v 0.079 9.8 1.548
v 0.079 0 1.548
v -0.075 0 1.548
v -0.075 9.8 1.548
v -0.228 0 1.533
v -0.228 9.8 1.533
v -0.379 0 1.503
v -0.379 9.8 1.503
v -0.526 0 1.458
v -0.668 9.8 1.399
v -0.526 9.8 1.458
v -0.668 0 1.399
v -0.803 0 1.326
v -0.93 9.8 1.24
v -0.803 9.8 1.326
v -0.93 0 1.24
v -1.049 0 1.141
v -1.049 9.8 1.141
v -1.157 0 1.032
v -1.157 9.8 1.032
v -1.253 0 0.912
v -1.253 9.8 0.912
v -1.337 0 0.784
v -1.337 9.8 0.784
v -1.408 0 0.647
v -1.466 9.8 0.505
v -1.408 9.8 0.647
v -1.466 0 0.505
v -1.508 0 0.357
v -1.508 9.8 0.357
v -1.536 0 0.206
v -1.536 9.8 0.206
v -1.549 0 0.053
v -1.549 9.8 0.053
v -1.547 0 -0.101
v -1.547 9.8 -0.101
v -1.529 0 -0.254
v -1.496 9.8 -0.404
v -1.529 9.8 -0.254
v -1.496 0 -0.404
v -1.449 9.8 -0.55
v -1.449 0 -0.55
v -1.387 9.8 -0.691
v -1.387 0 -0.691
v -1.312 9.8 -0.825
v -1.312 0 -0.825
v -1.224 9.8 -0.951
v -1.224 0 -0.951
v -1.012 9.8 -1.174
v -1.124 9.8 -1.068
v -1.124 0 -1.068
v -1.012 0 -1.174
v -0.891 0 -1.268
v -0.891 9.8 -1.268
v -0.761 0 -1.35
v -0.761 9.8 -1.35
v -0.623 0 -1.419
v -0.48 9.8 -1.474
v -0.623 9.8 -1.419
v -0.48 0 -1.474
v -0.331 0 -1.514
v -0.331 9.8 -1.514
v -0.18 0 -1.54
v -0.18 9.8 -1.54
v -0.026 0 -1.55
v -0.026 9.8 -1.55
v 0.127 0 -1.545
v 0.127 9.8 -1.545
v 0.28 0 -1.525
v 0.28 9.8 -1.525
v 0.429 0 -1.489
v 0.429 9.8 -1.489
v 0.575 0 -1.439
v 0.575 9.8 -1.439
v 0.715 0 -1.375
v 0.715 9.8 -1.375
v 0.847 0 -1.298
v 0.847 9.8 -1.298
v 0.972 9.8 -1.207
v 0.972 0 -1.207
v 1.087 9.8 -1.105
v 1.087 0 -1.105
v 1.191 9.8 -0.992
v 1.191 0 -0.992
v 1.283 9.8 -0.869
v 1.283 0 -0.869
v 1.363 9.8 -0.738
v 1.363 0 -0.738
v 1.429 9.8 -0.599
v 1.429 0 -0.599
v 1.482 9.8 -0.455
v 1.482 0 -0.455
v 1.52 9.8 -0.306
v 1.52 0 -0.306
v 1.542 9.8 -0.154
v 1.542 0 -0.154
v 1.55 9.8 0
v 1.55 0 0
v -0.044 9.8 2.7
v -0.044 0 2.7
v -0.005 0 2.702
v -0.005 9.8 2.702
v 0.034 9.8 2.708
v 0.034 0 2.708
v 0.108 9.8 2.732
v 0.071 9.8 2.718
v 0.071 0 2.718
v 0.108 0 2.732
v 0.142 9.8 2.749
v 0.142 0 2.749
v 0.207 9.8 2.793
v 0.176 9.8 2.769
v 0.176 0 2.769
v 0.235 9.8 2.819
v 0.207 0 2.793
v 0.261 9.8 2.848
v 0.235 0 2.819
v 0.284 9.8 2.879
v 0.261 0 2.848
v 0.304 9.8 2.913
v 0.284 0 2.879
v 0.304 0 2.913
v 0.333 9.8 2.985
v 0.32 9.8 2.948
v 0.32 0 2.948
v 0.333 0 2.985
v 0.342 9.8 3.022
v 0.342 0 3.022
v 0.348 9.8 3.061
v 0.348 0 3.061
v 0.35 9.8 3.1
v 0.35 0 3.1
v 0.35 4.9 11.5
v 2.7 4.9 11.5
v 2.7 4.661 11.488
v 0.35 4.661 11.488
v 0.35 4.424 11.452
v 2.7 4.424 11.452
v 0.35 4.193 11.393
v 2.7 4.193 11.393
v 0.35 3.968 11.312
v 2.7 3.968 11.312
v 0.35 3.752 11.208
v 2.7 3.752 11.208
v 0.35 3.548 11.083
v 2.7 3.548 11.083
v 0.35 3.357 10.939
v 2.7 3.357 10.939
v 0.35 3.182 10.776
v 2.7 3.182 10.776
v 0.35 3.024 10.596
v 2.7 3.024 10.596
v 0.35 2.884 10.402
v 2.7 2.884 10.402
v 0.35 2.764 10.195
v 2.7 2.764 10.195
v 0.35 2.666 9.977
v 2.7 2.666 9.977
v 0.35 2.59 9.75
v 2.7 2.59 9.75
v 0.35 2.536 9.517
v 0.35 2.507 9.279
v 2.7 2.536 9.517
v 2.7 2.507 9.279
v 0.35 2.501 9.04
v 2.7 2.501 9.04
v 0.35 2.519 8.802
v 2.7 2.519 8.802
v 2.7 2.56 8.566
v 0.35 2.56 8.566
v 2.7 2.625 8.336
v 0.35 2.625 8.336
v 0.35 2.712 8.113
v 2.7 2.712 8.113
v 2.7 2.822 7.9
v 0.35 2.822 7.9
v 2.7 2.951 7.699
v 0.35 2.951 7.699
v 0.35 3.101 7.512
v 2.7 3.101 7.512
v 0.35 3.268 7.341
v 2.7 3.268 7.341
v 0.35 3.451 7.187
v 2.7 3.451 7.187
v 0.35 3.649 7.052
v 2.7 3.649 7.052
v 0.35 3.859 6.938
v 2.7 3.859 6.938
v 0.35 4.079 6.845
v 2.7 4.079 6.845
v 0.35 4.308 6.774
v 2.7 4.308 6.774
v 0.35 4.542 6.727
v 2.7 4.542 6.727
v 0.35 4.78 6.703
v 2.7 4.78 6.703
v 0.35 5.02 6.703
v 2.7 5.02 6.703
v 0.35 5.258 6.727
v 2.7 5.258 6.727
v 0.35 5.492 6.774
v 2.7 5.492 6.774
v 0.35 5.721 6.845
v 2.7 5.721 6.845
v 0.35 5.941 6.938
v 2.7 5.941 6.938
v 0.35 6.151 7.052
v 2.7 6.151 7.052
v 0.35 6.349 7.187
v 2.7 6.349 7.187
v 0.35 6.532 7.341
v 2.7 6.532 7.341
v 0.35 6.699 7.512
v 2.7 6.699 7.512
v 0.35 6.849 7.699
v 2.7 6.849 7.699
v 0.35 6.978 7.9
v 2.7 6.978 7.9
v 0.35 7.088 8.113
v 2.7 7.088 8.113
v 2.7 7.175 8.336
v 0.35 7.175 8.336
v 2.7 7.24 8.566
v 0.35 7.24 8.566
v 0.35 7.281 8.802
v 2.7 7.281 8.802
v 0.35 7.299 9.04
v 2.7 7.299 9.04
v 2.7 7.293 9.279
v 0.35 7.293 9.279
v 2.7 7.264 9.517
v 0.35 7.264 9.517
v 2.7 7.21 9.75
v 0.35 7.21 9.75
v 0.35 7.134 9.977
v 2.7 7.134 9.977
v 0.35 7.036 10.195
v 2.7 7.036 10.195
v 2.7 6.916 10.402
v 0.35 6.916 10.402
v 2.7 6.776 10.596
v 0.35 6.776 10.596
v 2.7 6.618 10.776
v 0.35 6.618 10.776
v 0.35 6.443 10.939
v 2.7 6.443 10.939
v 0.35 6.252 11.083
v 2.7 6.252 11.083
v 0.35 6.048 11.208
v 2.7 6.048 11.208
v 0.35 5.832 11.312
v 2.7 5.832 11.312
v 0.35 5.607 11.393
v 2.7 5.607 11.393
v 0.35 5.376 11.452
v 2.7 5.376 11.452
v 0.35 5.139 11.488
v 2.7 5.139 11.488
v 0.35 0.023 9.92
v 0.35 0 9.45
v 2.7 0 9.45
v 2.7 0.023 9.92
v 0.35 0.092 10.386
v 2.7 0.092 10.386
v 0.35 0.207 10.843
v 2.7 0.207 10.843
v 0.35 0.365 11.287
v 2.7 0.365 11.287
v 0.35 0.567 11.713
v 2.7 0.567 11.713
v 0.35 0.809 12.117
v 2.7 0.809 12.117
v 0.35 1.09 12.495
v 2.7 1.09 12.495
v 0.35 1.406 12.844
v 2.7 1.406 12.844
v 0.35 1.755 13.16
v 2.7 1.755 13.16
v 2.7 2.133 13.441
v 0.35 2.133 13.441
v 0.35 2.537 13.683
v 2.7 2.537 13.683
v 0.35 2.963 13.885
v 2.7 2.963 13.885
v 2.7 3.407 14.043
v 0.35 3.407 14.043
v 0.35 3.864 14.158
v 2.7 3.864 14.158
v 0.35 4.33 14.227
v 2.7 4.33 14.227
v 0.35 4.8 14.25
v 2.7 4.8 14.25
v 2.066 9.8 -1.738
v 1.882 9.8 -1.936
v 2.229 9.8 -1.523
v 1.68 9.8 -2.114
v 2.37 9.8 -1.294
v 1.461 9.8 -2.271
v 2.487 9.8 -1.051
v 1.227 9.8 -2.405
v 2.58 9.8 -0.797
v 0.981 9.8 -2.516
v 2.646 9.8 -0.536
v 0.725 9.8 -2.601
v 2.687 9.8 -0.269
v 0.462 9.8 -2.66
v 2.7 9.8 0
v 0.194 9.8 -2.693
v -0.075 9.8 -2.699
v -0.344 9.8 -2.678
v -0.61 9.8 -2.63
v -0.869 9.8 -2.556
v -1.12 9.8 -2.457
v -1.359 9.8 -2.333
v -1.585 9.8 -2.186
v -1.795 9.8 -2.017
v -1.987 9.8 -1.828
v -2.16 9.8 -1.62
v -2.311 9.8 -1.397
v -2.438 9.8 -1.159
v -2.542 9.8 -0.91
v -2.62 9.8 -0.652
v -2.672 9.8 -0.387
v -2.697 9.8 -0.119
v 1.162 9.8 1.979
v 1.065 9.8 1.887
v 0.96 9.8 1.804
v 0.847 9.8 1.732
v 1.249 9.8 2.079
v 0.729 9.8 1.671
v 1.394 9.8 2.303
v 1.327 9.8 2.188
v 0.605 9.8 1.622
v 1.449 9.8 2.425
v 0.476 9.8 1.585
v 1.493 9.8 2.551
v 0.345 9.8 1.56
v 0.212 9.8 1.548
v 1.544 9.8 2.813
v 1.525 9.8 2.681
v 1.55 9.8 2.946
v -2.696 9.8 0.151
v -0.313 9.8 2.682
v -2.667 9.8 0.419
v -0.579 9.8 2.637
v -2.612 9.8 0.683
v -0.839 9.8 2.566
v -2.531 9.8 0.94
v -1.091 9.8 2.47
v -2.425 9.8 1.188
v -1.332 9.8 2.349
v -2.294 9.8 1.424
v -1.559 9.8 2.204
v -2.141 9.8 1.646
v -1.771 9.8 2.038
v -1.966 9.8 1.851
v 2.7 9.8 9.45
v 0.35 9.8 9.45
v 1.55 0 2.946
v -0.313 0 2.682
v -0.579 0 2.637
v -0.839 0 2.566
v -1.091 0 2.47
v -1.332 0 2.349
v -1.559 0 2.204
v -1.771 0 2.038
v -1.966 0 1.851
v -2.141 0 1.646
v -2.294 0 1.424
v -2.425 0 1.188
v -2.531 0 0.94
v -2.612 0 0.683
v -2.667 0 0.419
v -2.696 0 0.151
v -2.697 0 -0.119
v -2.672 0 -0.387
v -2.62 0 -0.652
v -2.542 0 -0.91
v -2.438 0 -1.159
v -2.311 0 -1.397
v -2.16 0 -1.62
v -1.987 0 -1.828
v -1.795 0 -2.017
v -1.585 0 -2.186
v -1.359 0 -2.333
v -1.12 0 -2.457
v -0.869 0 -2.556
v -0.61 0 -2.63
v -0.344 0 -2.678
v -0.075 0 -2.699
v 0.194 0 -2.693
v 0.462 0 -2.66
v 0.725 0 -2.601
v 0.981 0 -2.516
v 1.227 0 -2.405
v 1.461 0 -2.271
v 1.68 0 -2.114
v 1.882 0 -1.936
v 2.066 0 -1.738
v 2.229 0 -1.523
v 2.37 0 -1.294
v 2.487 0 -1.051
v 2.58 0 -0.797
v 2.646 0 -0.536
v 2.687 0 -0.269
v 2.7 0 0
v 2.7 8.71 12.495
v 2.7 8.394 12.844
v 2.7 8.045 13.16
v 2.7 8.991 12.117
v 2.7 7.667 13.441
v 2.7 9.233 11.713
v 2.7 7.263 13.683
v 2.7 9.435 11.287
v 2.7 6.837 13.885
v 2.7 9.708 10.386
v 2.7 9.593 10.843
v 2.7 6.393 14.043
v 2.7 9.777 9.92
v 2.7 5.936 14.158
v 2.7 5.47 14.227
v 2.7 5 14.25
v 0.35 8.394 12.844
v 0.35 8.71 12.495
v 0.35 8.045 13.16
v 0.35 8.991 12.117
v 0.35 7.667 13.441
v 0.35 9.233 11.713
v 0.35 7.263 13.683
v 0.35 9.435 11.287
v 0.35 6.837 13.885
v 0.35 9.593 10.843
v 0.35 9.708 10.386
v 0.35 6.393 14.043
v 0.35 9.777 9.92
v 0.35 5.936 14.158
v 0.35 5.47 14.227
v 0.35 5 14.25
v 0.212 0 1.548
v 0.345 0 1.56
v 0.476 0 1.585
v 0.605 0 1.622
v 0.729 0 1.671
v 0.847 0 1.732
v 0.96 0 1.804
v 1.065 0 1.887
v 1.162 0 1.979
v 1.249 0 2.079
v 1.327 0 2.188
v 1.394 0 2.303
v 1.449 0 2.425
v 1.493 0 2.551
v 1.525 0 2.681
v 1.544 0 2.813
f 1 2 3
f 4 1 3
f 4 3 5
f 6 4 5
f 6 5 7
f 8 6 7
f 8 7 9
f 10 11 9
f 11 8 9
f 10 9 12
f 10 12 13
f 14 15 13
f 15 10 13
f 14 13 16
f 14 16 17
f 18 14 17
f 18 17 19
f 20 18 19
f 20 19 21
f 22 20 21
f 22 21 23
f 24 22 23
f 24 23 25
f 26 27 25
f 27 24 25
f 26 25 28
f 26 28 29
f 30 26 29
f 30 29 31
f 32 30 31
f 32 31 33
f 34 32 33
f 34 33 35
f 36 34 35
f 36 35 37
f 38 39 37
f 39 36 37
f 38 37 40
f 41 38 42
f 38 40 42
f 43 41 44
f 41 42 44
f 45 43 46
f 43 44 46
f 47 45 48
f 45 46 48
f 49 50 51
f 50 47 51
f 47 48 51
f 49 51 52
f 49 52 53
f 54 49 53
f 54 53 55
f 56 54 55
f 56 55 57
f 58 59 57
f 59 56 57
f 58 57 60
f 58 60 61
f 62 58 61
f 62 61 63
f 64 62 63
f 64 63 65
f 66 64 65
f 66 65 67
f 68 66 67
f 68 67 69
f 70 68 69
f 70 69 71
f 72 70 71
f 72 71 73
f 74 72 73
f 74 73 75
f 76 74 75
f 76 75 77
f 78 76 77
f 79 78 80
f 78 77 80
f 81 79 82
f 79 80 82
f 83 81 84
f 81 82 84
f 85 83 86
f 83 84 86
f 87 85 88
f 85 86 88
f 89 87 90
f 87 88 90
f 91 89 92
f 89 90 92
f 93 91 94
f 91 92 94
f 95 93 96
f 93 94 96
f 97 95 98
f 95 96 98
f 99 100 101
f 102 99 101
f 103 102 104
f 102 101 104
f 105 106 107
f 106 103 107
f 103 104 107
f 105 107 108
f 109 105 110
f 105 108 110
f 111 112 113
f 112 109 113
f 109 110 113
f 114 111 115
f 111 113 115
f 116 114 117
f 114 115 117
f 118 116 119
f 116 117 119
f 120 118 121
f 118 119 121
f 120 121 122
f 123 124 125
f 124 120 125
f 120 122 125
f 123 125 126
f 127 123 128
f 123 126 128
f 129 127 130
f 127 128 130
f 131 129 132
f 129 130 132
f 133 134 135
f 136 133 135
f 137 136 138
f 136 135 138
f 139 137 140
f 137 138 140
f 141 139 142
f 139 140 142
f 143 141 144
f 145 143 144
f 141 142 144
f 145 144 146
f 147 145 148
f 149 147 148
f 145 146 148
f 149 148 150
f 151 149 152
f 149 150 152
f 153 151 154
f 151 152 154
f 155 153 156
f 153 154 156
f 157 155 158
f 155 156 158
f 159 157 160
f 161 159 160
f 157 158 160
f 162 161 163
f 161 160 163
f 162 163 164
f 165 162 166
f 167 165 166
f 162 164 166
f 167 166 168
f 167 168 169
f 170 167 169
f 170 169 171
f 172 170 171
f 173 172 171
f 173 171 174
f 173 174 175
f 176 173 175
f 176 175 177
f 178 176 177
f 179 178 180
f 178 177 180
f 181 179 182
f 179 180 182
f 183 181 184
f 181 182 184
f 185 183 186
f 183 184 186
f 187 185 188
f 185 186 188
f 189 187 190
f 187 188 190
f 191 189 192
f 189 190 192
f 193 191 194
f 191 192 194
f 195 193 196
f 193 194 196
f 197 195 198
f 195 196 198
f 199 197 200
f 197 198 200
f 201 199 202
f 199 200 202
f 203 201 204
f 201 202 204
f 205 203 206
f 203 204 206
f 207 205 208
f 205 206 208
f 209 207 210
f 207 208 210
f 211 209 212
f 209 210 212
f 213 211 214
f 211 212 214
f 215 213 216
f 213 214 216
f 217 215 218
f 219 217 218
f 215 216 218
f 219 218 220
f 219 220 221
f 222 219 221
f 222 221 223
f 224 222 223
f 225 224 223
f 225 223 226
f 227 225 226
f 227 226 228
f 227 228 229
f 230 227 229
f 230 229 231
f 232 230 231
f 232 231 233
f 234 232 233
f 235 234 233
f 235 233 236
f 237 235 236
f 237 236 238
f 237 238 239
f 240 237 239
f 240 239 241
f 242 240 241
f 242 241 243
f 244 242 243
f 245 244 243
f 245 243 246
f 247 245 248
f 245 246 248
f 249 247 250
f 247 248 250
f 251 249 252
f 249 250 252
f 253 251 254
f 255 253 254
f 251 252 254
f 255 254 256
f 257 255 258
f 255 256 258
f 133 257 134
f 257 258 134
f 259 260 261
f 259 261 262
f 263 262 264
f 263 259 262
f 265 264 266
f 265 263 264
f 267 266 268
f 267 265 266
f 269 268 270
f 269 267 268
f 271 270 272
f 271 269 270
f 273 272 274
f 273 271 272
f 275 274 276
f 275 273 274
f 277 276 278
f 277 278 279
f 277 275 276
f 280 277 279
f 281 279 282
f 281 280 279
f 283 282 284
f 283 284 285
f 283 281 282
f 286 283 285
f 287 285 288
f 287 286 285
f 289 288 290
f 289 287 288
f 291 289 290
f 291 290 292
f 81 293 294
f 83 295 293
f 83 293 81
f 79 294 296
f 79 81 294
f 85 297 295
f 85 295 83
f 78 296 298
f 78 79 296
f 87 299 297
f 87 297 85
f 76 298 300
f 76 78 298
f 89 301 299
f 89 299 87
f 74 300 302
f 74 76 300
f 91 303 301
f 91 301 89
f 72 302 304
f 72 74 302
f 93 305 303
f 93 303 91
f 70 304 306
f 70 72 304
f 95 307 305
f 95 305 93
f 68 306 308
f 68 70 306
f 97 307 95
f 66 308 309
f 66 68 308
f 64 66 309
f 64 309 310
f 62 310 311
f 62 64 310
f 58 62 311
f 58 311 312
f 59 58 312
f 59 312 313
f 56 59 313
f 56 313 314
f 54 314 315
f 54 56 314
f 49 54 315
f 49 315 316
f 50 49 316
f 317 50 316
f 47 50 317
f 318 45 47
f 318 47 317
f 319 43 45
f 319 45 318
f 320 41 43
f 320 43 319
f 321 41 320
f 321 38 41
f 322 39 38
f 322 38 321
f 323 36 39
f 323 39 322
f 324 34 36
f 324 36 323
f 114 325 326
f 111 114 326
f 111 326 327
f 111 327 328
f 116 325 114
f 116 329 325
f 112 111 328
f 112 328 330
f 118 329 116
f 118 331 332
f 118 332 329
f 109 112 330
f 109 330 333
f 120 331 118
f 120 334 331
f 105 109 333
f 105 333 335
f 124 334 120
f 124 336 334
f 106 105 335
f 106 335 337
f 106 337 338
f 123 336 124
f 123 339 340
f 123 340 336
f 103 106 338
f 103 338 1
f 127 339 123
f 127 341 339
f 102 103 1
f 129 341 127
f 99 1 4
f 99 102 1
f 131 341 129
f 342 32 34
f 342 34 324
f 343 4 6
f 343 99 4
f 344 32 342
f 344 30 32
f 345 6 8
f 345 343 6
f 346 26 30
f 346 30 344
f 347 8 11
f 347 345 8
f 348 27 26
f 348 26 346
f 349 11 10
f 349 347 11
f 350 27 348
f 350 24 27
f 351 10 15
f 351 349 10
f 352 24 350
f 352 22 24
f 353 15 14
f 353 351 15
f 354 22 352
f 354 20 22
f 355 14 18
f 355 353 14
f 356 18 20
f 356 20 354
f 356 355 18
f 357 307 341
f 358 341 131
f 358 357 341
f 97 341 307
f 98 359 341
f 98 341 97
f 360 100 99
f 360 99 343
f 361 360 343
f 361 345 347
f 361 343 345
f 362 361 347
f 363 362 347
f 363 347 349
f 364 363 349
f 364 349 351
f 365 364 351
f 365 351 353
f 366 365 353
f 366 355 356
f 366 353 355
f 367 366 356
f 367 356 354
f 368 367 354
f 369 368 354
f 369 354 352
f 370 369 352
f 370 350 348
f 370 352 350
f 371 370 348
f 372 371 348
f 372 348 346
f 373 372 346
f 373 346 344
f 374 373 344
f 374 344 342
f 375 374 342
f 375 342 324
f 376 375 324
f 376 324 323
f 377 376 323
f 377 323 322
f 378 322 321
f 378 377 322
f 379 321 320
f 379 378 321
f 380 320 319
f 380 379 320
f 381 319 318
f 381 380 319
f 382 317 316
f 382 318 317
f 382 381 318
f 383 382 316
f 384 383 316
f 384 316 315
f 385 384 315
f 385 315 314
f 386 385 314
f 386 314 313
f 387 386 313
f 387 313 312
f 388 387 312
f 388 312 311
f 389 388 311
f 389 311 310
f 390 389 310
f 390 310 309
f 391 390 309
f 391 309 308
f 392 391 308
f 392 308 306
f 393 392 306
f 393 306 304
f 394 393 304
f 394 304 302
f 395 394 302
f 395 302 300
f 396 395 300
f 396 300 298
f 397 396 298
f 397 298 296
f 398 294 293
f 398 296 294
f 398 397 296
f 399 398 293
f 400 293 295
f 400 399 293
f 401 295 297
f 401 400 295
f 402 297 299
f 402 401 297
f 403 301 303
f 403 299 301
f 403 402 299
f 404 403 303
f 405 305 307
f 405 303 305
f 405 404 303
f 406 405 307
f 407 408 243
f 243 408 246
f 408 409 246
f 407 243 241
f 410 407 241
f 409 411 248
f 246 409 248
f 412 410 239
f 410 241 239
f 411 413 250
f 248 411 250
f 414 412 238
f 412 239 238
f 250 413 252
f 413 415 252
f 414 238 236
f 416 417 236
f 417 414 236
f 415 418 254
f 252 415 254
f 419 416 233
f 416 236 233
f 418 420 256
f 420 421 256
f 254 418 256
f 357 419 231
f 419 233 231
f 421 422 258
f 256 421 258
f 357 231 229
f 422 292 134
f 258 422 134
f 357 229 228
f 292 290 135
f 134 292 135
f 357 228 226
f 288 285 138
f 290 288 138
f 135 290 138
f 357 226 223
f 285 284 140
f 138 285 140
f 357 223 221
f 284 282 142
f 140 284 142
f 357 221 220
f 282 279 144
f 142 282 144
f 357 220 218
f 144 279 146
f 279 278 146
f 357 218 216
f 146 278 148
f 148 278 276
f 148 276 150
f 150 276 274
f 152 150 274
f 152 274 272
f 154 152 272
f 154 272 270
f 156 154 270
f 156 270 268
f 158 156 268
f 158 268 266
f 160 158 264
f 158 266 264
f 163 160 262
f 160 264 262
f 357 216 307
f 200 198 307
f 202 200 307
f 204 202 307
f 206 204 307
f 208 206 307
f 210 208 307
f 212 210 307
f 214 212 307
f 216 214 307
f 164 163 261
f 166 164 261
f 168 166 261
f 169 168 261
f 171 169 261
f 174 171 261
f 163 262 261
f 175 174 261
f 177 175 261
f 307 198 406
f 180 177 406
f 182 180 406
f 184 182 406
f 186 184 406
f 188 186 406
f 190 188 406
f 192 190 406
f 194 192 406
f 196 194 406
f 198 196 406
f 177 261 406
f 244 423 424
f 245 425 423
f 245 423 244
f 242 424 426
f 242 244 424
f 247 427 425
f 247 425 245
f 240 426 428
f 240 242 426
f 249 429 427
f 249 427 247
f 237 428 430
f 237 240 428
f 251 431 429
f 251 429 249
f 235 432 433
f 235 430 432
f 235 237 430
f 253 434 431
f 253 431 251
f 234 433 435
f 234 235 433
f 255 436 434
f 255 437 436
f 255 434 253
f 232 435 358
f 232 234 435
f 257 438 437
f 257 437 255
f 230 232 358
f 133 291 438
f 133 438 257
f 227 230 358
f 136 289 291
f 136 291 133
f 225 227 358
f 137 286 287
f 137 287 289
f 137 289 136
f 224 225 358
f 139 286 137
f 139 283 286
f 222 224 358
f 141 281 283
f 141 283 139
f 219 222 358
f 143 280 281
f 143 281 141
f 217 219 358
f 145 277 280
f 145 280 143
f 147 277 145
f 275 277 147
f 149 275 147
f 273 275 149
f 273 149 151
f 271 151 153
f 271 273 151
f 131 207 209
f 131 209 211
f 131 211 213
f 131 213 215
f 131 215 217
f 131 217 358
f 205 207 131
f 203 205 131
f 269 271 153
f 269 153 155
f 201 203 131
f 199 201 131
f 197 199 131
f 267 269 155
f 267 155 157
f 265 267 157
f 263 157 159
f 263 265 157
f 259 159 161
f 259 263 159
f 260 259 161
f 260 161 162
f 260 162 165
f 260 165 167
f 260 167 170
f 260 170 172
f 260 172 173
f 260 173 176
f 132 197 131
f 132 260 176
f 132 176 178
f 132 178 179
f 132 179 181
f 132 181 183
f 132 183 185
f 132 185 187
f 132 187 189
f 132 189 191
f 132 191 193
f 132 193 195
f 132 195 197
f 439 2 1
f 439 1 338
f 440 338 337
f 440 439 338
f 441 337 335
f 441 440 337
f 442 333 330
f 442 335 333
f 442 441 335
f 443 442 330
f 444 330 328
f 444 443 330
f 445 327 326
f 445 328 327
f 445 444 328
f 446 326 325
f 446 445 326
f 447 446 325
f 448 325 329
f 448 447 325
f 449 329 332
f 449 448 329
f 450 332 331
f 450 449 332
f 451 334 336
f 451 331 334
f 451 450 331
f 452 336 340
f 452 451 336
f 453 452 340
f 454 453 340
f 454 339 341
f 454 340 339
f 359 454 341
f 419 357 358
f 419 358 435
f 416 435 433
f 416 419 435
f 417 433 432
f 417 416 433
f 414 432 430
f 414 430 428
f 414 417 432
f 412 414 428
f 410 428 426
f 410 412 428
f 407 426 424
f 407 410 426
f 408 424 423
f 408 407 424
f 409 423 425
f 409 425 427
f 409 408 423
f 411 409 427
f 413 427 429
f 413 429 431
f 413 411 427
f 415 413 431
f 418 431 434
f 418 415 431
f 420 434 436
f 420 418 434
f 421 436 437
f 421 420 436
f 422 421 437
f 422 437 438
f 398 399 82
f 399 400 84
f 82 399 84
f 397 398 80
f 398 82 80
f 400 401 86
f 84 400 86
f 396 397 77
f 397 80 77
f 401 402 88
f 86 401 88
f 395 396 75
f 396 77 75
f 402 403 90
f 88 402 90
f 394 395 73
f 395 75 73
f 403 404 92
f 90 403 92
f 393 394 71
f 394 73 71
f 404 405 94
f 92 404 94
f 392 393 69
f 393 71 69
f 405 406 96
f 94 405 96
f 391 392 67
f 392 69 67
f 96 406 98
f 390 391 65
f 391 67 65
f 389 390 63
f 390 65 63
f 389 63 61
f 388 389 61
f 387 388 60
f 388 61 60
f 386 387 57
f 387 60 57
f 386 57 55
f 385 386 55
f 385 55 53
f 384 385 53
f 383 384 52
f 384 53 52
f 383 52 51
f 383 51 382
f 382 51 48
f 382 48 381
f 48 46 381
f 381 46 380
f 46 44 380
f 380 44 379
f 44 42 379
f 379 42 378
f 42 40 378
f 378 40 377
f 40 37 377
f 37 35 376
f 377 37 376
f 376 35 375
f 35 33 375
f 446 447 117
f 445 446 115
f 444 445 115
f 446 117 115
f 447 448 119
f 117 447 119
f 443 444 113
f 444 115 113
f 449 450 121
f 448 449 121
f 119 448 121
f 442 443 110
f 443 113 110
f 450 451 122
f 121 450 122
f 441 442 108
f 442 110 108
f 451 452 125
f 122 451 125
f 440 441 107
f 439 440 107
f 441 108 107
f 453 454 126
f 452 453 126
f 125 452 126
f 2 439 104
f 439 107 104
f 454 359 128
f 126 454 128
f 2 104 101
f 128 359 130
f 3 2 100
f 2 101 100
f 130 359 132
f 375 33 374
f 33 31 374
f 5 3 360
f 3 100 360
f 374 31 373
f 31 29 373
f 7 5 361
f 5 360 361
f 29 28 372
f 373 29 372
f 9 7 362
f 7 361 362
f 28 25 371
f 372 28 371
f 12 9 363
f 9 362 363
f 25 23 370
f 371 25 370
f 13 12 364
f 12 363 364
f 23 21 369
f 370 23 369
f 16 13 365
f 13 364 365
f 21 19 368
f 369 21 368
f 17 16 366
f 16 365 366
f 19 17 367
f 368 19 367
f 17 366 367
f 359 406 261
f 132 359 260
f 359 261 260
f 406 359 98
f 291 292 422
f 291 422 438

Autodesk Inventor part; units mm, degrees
ref_plane "YZ Plane" through (0, 0, 0) normal (1, 0, 0) x (0, 1, 0)
ref_plane "XZ Plane" through (0, 0, 0) normal (0, 1, 0) x (-1, 0, 0)
ref_plane "XY Plane" through (0, 0, 0) normal (0, 0, 1) x (1, 0, 0)
sketch "Sketch1" plane through (0, 0, 0) normal (0, 1, 0) x (-1, 0, 0)
  arc A0 (-1.55, 0) -> (-0.0788, 1.548) centre (0, 0) ccw
  line L0 (-1.55, 14.25) -> (-1.55, 0)
  arc A1 (-1.55, 2.9462) -> (-0.0788, 1.548) centre (-0.15, 2.9462) ccw
  arc A2 (-0.35, 3.0996) -> (0.0435, 2.6996) centre (0.05, 3.0996) ccw
  line L1 (-1.55, 14.25) -> (-0.35, 14.25)
  line L2 (-0.35, 14.25) -> (-0.35, 3.0996)
  line L3 (-2.7, 14.25) -> (-2.7, 0)
  line L4 (-2.7, 14.25) -> (-1.55, 14.25)
  arc A3 (-2.7, 0) -> (0.0435, 2.6996) centre (0, 0) ccw
  dimension "d0" = 3.1
  dimension "d1" = 2.8
  dimension "d2" = 14.25
  dimension "d6" = 0.8
extrude "Extrusion1" add sketch "Sketch1" along normal blind 9.8
sketch "Sketch2" plane through (0.35, 0, 3.0996) normal (-1, 0, 0) x (0, 0, 1)
  line L0 (6.0004, -8.6055) -> (6.0004, 17.2383) construction
  line L1 (-11.7051, 4.9) -> (18.5644, 4.9) construction
  line L2 (11.1504, 0) -> (11.1504, 9.8) construction
  line L3 (-3.0996, 0) -> (-0.3999, 0) construction
  line L4 (-0.3999, 0) -> (-0.3999, 9.8) construction
  line L5 (-3.0996, 9.8) -> (-0.3999, 9.8) construction
  line L6 (-3.0996, 0) -> (-3.0996, 9.8) construction
  line L7 (-3.0996, 0) -> (-3.0996, 9.8) construction
  line L8 (-5.7996, 0) -> (-5.7996, 9.8) construction
  point P0 (11.1504, 4.9)
  point P1 (6.0004, 4.9)
  dimension "d9" = 11.8
hole "Hole1" at (0.35, 4.9, 9.1) direction (1, 0, 0) diameter 4.8 end through all
fillet "Fillet1" radius 4.8 2 edges at (1.525, 9.8, 14.25) (1.525, 0, 14.25)
properties part number "Cable Clip 3-1Dia RS817-8956"
